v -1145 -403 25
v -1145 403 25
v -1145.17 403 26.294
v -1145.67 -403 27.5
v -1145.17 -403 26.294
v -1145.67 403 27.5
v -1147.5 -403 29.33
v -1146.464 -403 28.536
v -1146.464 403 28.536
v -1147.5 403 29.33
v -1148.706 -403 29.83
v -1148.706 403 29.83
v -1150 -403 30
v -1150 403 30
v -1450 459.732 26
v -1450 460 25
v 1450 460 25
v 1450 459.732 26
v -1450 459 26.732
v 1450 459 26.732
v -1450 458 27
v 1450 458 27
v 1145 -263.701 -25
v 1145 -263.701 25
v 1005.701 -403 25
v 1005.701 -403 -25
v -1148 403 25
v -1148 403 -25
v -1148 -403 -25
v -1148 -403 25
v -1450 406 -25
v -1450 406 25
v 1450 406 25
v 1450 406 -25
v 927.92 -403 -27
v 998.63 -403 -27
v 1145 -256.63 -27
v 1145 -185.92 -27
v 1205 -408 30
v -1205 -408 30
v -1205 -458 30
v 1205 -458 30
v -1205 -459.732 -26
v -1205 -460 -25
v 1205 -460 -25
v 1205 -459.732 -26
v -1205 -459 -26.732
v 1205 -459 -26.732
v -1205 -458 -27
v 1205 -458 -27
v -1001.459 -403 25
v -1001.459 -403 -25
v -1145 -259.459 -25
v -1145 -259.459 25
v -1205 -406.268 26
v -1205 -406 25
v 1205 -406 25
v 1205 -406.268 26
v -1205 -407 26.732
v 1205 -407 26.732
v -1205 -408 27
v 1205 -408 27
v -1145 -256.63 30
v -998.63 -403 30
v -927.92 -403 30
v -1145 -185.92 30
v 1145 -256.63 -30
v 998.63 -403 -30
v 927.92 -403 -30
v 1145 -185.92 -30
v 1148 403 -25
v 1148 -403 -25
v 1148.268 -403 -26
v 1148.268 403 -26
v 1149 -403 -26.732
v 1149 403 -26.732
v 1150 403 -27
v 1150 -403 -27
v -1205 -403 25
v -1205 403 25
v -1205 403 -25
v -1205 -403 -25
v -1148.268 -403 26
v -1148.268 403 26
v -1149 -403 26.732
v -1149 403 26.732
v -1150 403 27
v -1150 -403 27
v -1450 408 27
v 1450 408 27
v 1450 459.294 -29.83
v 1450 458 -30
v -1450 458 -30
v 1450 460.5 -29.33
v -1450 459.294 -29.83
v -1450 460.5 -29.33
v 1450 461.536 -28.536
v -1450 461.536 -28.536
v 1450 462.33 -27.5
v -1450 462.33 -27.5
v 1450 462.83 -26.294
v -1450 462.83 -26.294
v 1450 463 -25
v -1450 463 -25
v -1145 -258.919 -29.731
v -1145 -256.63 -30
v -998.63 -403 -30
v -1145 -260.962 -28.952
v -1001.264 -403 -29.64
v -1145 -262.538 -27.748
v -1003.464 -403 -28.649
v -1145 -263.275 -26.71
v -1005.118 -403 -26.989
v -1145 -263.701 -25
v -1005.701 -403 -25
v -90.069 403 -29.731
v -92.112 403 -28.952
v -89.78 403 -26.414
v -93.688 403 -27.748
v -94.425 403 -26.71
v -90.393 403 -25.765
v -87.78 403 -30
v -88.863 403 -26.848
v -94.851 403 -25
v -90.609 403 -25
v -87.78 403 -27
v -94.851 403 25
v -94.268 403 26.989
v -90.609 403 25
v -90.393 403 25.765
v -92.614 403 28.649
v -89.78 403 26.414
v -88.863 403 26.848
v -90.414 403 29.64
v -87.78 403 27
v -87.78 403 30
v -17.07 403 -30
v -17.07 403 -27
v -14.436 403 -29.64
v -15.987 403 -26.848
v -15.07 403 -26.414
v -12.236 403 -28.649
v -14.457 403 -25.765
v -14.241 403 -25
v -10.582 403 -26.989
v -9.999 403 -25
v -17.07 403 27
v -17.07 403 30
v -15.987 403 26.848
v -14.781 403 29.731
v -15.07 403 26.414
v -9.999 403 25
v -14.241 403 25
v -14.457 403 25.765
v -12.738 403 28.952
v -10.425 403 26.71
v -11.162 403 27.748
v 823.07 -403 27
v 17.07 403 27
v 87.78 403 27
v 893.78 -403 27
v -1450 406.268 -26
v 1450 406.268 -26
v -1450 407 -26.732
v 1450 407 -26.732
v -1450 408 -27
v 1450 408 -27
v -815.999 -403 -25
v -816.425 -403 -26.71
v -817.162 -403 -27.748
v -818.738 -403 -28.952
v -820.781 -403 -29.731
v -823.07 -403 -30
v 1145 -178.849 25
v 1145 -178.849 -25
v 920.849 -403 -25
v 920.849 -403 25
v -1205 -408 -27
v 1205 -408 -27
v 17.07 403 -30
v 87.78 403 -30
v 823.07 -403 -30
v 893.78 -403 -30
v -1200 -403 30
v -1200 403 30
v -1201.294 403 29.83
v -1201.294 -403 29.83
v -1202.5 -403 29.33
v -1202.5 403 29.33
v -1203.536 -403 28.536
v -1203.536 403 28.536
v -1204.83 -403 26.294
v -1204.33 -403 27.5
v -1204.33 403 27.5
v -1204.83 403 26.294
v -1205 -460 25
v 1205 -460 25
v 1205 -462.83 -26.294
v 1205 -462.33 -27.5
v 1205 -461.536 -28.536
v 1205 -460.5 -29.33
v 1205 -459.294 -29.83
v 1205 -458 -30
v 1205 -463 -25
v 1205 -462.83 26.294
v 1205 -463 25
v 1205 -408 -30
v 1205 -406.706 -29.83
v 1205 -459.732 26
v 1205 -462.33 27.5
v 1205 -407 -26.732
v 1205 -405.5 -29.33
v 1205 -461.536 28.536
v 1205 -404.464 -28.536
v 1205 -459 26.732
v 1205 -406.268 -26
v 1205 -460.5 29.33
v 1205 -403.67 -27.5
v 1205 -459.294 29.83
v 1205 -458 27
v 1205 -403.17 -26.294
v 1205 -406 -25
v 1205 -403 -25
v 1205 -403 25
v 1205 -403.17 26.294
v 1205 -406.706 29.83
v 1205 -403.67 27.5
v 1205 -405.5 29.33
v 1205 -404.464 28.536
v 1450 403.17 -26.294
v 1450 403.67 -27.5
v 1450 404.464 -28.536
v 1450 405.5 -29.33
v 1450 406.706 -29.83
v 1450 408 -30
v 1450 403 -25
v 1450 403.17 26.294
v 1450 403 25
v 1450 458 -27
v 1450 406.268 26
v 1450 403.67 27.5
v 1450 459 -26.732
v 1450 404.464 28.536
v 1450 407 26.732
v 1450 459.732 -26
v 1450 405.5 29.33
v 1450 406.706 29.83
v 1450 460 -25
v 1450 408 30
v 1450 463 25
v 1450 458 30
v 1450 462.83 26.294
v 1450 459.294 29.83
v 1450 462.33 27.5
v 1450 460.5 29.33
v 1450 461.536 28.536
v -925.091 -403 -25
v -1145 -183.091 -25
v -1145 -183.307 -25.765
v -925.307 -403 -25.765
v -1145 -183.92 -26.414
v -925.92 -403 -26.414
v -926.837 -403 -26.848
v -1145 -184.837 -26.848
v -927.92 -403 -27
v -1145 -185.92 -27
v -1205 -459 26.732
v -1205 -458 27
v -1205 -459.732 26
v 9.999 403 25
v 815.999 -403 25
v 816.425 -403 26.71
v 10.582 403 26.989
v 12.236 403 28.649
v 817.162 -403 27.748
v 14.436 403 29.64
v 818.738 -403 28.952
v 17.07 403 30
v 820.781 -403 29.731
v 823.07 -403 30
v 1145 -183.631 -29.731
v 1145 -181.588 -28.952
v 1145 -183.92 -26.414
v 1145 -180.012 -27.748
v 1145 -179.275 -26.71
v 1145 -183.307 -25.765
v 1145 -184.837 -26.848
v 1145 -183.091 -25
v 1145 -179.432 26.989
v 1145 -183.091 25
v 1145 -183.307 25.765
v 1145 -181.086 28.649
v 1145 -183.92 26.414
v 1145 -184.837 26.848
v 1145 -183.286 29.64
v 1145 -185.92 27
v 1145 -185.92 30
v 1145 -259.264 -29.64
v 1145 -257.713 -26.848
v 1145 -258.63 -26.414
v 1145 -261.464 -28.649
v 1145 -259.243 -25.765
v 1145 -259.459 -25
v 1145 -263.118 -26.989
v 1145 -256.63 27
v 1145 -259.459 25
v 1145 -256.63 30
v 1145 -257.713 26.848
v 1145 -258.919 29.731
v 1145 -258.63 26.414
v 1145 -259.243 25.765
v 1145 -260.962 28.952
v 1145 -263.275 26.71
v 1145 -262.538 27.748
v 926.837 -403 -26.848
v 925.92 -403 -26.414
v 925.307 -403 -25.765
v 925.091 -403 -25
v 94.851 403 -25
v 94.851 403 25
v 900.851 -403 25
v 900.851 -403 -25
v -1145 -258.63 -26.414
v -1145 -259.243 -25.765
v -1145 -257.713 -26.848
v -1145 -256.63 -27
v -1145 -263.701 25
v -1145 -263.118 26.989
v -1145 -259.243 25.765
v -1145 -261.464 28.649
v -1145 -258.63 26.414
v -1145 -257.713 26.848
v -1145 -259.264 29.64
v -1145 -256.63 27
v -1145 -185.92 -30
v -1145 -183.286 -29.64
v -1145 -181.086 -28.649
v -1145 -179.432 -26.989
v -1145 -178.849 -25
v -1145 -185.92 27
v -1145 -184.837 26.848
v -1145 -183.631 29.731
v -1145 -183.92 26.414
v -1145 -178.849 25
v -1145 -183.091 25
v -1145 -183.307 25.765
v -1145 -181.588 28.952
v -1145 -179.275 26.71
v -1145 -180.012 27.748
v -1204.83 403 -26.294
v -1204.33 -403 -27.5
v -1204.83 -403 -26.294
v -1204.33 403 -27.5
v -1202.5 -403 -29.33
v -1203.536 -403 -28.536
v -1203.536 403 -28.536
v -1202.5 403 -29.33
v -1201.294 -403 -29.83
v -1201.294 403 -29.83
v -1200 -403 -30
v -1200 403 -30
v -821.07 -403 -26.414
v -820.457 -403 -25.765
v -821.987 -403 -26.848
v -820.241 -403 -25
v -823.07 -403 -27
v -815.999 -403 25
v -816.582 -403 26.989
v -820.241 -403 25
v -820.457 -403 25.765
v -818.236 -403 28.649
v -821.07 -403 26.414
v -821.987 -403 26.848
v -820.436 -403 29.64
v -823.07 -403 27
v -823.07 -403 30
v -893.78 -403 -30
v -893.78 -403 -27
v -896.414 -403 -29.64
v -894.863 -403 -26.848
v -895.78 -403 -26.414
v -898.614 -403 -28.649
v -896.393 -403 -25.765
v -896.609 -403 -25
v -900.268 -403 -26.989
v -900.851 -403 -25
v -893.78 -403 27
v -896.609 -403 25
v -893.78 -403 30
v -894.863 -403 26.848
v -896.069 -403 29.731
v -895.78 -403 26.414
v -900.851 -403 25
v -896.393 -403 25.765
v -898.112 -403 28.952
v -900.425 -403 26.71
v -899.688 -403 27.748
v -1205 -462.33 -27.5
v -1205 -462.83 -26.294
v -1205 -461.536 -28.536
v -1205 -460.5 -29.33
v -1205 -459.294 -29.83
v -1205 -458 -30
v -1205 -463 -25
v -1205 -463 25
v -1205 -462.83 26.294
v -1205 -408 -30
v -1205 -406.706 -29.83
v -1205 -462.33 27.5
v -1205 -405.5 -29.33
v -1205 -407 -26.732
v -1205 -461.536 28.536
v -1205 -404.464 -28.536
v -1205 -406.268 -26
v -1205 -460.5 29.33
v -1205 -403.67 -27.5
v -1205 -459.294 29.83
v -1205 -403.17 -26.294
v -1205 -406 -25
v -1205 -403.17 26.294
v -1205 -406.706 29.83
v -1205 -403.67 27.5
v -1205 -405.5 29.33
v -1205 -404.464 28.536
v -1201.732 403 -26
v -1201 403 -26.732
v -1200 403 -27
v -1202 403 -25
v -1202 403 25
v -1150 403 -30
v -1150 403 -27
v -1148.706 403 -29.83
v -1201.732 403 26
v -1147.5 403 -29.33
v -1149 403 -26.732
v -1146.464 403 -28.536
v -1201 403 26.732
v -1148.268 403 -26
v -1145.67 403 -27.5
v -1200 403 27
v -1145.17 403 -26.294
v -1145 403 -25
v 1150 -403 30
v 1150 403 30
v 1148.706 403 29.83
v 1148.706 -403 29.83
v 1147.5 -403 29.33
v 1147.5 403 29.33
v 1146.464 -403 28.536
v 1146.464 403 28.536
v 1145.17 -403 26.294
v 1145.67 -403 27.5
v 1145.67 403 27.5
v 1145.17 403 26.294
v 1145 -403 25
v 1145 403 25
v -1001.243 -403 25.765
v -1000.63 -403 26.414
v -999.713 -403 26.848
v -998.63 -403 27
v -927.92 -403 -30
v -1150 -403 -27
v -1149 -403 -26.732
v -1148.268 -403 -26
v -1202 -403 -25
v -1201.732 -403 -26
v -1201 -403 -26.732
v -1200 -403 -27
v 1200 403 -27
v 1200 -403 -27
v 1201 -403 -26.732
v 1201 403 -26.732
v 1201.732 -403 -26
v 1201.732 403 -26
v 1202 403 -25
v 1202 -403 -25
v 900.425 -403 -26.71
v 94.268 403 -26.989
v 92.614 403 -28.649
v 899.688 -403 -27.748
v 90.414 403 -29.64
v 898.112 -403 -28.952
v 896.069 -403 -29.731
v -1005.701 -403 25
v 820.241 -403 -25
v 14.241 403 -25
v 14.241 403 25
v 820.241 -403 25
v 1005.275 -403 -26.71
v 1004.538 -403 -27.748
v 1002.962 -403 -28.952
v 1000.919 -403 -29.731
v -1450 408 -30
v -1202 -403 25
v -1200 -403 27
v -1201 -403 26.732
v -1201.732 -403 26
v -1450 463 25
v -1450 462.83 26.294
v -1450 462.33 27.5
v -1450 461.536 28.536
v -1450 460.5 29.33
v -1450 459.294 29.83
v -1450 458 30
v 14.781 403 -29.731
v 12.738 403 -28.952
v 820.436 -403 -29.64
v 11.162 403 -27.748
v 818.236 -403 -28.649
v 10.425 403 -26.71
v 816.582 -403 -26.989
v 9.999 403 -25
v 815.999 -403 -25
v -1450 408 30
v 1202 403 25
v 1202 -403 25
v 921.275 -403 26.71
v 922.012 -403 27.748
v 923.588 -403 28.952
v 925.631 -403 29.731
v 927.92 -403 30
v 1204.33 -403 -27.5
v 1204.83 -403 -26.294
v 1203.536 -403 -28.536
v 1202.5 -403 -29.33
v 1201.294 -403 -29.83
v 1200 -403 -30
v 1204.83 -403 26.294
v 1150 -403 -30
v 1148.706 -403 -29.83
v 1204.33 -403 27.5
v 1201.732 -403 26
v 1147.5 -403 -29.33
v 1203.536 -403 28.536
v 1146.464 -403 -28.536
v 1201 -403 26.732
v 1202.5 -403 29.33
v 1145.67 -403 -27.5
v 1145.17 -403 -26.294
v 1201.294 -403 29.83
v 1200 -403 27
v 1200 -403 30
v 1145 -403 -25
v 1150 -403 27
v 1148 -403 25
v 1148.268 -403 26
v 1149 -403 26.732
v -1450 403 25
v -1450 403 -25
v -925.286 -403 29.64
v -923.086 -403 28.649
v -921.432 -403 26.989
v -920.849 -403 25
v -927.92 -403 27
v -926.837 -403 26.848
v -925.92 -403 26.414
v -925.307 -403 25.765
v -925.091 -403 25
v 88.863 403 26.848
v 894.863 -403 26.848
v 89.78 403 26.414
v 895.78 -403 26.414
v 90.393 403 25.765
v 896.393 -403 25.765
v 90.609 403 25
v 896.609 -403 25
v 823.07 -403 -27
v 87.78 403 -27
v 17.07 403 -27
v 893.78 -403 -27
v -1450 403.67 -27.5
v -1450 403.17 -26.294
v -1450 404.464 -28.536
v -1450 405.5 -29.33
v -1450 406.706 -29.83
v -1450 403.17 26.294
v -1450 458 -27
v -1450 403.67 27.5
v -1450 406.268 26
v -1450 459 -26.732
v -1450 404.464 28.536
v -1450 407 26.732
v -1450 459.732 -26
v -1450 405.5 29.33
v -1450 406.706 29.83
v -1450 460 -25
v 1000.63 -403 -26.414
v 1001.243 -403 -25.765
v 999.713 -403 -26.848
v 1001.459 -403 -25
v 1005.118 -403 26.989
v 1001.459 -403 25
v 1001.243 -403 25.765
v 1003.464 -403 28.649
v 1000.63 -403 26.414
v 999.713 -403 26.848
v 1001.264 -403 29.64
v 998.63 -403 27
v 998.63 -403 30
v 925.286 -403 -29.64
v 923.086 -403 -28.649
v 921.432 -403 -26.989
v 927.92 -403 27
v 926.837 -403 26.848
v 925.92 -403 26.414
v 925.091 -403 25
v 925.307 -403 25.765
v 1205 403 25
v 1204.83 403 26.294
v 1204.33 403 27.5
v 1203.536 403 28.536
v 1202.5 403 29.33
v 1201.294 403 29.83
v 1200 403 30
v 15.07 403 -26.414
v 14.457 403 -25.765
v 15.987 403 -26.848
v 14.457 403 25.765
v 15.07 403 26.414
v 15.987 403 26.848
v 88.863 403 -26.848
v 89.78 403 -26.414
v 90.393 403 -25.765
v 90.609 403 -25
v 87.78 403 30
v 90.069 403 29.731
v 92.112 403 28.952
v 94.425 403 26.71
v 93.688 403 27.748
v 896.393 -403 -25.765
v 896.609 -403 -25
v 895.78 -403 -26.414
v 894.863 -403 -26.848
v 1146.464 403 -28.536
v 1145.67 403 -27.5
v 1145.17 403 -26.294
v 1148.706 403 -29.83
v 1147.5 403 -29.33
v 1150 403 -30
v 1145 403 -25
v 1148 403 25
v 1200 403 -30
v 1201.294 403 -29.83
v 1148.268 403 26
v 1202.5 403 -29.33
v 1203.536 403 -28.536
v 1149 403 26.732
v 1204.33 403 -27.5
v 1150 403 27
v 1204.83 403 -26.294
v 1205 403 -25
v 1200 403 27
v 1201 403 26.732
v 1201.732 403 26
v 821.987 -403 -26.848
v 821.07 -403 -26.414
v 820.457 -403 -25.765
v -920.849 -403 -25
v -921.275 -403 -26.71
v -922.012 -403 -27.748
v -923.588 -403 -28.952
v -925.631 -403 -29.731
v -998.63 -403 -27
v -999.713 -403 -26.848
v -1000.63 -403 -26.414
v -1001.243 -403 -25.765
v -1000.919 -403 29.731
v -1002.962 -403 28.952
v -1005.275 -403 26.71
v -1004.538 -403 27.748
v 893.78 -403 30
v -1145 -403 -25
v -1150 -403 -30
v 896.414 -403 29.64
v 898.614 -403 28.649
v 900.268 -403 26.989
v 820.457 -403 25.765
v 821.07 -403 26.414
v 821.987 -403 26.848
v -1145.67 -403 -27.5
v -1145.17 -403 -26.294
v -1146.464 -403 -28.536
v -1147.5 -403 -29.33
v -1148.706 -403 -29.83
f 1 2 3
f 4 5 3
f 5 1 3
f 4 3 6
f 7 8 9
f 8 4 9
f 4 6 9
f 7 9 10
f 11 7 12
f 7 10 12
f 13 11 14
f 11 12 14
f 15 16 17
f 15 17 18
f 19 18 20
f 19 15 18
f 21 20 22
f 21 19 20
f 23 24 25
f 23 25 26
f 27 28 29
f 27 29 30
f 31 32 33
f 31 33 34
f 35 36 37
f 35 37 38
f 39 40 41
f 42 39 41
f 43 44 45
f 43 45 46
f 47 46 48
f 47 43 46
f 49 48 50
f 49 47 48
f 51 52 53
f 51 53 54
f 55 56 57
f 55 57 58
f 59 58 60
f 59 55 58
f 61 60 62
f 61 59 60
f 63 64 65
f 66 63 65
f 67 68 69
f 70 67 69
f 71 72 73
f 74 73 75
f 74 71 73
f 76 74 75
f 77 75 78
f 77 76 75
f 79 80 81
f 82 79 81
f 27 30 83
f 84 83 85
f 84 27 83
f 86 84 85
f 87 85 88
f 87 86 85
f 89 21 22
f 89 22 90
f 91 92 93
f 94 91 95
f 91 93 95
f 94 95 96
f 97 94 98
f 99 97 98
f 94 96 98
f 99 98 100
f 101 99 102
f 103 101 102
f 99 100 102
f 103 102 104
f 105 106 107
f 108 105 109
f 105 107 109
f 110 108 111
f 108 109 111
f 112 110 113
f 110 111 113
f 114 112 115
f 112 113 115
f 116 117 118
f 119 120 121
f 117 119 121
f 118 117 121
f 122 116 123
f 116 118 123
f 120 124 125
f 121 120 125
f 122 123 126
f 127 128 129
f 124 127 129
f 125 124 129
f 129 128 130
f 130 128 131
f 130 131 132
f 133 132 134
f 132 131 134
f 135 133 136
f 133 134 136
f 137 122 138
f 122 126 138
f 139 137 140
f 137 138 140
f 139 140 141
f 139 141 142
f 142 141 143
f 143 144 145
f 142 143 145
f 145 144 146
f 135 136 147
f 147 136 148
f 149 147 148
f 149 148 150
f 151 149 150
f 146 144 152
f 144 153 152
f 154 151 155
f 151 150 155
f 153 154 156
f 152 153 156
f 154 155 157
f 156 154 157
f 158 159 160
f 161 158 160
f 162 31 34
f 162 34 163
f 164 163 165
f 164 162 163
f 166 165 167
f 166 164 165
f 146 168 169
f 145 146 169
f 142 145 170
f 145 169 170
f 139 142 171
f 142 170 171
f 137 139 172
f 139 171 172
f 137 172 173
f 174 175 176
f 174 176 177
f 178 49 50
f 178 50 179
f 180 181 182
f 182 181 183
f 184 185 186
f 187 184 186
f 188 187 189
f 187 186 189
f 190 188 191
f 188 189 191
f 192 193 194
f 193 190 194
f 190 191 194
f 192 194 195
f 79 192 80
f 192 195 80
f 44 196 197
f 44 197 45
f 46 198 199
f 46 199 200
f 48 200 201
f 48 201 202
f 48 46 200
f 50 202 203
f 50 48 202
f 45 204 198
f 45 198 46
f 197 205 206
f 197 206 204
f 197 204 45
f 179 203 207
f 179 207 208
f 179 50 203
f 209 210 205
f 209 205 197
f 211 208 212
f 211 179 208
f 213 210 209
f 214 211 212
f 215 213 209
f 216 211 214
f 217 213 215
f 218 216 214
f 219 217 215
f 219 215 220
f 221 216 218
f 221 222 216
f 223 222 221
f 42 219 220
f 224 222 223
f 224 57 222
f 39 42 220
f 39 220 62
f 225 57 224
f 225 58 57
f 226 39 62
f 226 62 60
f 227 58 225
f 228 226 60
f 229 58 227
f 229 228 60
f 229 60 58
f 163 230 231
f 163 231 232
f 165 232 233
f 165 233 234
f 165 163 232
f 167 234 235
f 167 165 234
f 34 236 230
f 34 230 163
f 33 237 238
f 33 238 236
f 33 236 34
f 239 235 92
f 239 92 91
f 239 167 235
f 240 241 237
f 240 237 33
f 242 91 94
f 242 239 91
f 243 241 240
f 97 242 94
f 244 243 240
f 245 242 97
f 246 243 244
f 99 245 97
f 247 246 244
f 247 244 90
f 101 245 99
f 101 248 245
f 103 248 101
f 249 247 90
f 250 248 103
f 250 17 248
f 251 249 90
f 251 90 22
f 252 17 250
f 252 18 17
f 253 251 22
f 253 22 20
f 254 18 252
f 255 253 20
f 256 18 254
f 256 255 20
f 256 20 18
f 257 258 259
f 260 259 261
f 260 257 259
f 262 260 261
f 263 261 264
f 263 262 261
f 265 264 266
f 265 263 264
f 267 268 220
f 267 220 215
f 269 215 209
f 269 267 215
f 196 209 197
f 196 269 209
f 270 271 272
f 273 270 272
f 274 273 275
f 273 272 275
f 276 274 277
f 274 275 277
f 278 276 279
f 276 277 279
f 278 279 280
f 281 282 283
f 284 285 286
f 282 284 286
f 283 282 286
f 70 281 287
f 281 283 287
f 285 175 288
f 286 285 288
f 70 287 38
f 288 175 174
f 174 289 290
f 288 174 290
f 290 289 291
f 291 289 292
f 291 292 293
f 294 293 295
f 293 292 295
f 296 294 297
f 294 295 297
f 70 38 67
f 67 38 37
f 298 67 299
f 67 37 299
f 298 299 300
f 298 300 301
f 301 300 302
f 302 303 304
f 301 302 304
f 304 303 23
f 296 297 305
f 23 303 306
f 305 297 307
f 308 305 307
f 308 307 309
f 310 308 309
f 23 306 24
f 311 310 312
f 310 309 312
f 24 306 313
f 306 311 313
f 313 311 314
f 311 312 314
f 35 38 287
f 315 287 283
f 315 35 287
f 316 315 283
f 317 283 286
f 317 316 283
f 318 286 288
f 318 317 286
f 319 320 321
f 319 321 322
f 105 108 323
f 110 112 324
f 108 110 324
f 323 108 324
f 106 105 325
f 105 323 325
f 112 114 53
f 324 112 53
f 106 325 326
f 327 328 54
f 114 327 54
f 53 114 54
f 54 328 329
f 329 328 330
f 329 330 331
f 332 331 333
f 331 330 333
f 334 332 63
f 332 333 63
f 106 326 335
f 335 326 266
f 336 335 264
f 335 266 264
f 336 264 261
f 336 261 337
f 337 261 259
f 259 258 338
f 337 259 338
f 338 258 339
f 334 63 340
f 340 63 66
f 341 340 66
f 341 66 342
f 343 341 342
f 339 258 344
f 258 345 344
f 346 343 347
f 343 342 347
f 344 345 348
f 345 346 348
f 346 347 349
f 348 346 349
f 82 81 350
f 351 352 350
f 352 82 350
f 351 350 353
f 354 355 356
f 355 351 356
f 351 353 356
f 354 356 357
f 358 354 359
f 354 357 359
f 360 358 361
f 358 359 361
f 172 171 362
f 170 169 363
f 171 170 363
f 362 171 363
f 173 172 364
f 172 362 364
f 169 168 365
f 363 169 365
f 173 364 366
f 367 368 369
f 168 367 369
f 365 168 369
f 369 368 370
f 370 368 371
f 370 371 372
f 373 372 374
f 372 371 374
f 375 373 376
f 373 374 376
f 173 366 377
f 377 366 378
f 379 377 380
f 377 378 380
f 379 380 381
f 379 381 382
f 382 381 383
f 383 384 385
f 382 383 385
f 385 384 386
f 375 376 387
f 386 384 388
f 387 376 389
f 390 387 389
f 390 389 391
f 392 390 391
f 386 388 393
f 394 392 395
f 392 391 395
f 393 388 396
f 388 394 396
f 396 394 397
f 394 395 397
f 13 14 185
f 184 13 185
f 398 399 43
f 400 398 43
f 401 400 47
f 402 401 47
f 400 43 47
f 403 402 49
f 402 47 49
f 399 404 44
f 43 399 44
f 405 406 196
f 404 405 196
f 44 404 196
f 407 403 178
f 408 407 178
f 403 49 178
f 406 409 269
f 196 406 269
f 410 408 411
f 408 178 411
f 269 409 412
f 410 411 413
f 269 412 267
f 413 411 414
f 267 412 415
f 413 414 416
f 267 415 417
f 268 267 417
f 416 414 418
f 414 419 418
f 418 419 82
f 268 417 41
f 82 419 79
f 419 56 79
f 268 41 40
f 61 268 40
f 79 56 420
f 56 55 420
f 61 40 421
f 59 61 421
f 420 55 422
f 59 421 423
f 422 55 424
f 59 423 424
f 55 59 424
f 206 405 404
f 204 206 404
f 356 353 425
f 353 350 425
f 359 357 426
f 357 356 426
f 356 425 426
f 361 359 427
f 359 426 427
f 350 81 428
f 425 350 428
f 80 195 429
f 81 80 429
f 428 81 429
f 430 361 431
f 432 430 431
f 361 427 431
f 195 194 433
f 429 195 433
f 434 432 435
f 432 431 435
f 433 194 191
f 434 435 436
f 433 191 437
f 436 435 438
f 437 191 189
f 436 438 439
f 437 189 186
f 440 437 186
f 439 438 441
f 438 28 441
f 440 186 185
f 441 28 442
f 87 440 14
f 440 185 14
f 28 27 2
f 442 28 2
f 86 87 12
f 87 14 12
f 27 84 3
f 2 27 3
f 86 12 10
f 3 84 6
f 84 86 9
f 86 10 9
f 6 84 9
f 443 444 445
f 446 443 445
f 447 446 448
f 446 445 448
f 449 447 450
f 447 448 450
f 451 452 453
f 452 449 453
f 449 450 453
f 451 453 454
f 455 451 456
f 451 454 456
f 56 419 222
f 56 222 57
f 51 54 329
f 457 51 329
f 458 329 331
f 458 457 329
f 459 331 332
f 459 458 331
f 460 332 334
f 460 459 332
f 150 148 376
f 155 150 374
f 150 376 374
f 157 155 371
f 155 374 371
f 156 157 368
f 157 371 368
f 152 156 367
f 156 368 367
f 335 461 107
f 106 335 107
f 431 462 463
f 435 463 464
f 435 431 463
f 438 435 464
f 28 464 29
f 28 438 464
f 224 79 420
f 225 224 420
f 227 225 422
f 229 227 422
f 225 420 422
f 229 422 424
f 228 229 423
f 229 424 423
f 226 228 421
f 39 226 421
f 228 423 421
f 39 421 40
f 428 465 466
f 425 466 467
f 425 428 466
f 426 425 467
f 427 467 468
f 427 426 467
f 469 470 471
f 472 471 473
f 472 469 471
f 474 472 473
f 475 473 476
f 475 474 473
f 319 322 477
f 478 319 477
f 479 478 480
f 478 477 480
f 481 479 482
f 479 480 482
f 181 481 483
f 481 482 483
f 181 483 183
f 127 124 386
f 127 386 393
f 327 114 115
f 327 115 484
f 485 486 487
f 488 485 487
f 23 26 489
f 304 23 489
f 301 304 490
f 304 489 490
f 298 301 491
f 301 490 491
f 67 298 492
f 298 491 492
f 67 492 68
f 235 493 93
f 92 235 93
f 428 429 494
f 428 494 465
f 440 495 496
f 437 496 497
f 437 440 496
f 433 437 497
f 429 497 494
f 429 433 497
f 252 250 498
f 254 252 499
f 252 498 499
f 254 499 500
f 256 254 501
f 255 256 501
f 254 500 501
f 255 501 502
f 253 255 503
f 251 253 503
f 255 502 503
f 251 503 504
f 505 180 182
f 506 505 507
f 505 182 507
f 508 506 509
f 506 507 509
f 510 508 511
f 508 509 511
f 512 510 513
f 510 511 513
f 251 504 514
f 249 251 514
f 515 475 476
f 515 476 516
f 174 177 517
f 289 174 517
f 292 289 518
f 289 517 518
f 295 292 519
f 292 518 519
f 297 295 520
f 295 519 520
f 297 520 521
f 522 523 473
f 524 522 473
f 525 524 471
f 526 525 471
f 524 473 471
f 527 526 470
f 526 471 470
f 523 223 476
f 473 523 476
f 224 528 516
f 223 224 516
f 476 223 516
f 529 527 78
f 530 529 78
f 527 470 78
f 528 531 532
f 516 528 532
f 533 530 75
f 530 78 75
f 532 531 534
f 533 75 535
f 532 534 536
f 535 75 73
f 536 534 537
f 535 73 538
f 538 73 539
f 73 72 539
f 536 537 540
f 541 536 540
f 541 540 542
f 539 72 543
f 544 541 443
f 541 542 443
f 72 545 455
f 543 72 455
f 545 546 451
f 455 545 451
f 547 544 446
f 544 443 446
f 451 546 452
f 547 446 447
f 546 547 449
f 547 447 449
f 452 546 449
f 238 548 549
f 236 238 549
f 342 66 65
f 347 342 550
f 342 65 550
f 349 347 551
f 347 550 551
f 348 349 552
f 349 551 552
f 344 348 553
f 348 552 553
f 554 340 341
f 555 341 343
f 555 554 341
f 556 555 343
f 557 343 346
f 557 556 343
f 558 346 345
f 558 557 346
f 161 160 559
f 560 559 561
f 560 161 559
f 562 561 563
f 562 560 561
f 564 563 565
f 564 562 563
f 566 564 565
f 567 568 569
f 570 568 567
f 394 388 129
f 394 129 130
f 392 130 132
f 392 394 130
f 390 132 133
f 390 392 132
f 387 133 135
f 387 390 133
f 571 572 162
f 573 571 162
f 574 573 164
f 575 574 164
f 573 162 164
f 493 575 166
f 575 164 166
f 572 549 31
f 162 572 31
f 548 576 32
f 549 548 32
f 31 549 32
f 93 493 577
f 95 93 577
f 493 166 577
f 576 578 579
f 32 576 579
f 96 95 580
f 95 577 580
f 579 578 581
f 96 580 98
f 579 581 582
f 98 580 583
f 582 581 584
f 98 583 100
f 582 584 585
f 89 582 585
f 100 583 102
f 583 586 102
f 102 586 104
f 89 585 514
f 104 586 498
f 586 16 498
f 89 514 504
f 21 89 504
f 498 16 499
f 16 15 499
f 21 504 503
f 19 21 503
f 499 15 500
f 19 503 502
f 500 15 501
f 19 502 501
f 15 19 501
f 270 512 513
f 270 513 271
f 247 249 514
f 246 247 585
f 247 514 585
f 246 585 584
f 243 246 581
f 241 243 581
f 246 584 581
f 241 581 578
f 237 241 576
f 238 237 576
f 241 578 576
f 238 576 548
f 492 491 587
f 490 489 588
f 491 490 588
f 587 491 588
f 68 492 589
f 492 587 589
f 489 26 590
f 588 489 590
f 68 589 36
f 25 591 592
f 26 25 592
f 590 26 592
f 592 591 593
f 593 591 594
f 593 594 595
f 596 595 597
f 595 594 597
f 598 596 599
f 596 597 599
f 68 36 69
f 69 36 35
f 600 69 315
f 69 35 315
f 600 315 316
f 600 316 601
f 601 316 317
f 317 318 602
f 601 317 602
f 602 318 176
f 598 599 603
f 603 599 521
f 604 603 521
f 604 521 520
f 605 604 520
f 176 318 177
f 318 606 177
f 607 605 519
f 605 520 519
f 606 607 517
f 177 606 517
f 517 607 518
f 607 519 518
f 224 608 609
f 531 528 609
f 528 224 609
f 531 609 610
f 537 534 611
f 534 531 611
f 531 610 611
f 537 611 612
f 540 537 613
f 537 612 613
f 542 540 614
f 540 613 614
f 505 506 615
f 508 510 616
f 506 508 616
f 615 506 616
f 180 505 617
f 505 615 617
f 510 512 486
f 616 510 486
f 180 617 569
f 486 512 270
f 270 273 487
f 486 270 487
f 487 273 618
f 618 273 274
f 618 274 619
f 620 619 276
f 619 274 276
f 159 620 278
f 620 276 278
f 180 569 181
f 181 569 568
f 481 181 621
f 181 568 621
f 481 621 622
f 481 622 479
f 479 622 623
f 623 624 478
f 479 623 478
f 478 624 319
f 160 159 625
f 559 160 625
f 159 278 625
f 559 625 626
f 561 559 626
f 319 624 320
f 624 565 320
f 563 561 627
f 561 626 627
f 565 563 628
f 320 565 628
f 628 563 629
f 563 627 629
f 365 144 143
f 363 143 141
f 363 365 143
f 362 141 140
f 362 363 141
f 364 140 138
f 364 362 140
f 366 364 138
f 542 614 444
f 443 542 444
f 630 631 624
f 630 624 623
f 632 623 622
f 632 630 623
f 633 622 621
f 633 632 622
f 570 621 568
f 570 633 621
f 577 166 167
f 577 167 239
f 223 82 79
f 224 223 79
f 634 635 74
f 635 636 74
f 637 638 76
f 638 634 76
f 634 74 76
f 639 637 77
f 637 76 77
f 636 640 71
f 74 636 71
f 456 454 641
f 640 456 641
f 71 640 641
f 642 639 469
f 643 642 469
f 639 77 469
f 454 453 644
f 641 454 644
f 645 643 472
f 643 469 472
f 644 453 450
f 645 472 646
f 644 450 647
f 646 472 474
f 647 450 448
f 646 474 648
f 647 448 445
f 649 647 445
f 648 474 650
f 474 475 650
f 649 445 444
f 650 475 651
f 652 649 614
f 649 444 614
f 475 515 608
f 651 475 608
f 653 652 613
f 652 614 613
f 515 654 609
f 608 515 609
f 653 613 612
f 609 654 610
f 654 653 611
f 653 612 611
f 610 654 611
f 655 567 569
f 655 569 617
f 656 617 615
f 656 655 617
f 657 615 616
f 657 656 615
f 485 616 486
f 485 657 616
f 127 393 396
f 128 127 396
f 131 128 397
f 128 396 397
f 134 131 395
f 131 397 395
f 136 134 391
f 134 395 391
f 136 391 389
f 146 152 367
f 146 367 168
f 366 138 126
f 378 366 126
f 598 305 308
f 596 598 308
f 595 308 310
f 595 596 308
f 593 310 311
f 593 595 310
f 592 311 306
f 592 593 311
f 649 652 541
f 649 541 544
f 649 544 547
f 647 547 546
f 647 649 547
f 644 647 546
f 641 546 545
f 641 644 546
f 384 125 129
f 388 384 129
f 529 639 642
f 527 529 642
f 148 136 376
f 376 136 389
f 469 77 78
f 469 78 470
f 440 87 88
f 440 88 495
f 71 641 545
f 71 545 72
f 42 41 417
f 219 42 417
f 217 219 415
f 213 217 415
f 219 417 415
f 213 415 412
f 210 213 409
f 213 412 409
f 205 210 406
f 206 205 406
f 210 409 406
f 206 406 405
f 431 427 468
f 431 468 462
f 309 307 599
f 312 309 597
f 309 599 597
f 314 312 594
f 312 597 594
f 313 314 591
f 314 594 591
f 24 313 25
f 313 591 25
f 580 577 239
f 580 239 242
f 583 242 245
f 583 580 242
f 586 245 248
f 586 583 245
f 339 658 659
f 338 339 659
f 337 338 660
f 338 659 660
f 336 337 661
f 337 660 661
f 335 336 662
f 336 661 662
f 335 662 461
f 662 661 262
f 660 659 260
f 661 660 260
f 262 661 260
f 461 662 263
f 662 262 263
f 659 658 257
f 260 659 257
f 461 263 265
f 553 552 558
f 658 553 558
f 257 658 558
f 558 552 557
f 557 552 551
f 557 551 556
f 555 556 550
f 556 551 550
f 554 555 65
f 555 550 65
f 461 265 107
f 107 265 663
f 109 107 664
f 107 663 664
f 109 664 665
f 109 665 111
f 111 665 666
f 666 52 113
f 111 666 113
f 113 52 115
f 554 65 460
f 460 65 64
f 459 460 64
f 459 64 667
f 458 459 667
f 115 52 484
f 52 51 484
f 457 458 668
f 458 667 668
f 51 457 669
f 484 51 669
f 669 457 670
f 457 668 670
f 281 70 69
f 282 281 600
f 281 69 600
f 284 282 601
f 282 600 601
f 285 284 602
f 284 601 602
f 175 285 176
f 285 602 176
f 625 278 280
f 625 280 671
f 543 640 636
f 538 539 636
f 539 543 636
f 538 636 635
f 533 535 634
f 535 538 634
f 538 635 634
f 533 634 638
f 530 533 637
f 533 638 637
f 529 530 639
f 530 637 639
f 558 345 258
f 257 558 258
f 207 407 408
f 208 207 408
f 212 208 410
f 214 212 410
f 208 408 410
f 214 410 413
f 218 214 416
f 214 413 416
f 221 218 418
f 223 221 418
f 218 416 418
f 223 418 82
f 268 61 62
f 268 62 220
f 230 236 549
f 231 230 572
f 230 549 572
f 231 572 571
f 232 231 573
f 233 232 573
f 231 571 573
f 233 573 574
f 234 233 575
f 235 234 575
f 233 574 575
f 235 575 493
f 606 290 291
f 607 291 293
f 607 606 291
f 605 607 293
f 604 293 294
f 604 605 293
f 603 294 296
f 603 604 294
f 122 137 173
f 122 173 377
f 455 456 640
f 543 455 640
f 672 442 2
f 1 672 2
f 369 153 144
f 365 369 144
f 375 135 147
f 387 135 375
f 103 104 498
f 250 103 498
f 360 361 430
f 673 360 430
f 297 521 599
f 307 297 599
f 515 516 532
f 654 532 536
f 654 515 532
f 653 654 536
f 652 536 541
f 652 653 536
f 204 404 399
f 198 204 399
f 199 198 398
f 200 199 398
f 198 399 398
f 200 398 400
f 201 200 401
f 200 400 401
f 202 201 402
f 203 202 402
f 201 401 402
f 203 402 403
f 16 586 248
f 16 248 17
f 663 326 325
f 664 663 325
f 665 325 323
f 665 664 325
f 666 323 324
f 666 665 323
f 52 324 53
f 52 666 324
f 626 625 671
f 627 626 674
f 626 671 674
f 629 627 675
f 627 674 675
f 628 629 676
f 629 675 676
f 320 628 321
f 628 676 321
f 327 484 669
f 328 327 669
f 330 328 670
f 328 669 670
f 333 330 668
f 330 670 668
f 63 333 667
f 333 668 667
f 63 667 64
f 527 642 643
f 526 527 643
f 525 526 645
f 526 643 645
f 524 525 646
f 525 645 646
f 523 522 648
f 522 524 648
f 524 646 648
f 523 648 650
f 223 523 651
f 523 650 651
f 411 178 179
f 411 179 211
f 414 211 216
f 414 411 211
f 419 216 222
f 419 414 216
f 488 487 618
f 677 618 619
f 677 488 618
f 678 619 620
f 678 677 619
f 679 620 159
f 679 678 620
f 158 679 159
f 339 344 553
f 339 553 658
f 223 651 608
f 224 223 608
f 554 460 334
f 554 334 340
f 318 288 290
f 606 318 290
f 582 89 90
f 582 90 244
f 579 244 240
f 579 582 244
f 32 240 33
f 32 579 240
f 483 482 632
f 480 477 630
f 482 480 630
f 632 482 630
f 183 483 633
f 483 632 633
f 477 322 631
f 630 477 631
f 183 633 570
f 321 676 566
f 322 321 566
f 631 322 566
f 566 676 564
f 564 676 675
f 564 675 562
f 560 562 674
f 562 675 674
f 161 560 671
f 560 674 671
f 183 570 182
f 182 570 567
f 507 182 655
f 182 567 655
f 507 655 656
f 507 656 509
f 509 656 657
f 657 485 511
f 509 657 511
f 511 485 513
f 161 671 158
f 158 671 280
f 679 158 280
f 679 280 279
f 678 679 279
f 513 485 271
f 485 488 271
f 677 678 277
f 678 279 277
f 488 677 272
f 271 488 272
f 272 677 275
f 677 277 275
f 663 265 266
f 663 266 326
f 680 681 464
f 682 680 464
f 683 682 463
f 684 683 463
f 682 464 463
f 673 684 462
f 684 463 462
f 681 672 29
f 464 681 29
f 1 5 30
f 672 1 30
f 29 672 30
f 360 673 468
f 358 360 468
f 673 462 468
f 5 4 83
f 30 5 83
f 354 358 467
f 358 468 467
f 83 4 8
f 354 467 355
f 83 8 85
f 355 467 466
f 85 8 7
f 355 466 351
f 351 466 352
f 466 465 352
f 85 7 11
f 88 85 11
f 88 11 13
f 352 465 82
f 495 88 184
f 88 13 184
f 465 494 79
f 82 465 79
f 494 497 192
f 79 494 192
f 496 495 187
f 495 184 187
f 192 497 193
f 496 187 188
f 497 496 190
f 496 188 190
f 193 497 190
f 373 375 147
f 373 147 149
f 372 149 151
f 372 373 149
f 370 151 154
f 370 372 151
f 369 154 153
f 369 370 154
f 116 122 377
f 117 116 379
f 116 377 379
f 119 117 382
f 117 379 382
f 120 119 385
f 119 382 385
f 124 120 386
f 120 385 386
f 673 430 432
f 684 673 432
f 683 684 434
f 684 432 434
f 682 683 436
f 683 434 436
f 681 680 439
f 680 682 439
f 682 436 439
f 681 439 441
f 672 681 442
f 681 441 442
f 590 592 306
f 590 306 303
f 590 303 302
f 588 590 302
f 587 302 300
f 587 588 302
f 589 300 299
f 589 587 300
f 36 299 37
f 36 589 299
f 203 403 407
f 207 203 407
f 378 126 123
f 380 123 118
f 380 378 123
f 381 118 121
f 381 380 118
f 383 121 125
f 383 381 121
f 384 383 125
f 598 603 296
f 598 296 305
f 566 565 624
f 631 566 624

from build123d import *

# Parameters (mm, degrees)
F_60_X_40_X_3_2_1_DEPTH   = 2900
F_60_X_40_X_3_2_1_2_DEPTH = 2410
F_60_X_40_X_3_2_1_3_DEPTH = 868
F_60_X_40_X_3_2_1_4_DEPTH = 868
F_60_X_40_X_3_2_1_5_DEPTH = 428.703587107
F_60_X_40_X_3_2_1_6_DEPTH = 1311.561758757
F_60_X_40_X_3_2_1_7_DEPTH = 1311.561758757
F_60_X_40_X_3_2_1_8_DEPTH = 428.703587107


with BuildPart() as part:
    # Sketch1 → Прямоугольная труба 60 X 40 X 3.2(1) (new body)
    with BuildSketch(Plane(origin=(-1450, 433, 0), x_dir=(0, 1, 0), z_dir=(1, 0, 0))):
        with BuildLine():
            Line((-25, -30), (25, -30))
            ThreePointArc((25, -30), (28.535533906, -28.535533906), (30, -25))
            Line((30, -25), (30, 25))
            ThreePointArc((30, 25), (28.535533906, 28.535533906), (25, 30))
            Line((25, 30), (-25, 30))
            ThreePointArc((-25, 30), (-28.535533906, 28.535533906), (-30, 25))
            Line((-30, 25), (-30, -25))
            ThreePointArc((-30, -25), (-28.535533906, -28.535533906), (-25, -30))
        make_face()
        with BuildLine():
            Line((-25, -27), (25, -27))
            ThreePointArc((25, -27), (26.414213562, -26.414213562), (27, -25))
            Line((27, -25), (27, 25))
            ThreePointArc((27, 25), (26.414213562, 26.414213562), (25, 27))
            Line((25, 27), (-25, 27))
            ThreePointArc((-25, 27), (-26.414213562, 26.414213562), (-27, 25))
            Line((-27, 25), (-27, -25))
            ThreePointArc((-27, -25), (-26.414213562, -26.414213562), (-25, -27))
        make_face(mode=Mode.SUBTRACT)
    extrude(amount=F_60_X_40_X_3_2_1_DEPTH)


with BuildPart() as body_2:
    # Sketch1 on segment 2 (carried to segment 2) → 60 X 40 X 3.2_1 2 (new body)
    with BuildSketch(Plane(origin=(-1205, -433, 0), x_dir=(0, 1, 0), z_dir=(1, 0, 0))):
        with BuildLine():
            Line((-25, -30), (25, -30))
            ThreePointArc((25, -30), (28.535533906, -28.535533906), (30, -25))
            Line((30, -25), (30, 25))
            ThreePointArc((30, 25), (28.535533906, 28.535533906), (25, 30))
            Line((25, 30), (-25, 30))
            ThreePointArc((-25, 30), (-28.535533906, 28.535533906), (-30, 25))
            Line((-30, 25), (-30, -25))
            ThreePointArc((-30, -25), (-28.535533906, -28.535533906), (-25, -30))
        make_face()
        with BuildLine():
            Line((-25, -27), (25, -27))
            ThreePointArc((25, -27), (26.414213562, -26.414213562), (27, -25))
            Line((27, -25), (27, 25))
            ThreePointArc((27, 25), (26.414213562, 26.414213562), (25, 27))
            Line((25, 27), (-25, 27))
            ThreePointArc((-25, 27), (-26.414213562, 26.414213562), (-27, 25))
            Line((-27, 25), (-27, -25))
            ThreePointArc((-27, -25), (-26.414213562, -26.414213562), (-25, -27))
        make_face(mode=Mode.SUBTRACT)
    extrude(amount=F_60_X_40_X_3_2_1_2_DEPTH)


with BuildPart() as body_3:
    # Sketch1 on segment 3 (carried to segment 3) → 60 X 40 X 3.2_1 3 (new body)
    with BuildSketch(Plane(origin=(-1175, 434, 0), x_dir=(1, 0, 0), z_dir=(0, -1, 0))):
        with BuildLine():
            Line((-25, -30), (25, -30))
            ThreePointArc((25, -30), (28.535533906, -28.535533906), (30, -25))
            Line((30, -25), (30, 25))
            ThreePointArc((30, 25), (28.535533906, 28.535533906), (25, 30))
            Line((25, 30), (-25, 30))
            ThreePointArc((-25, 30), (-28.535533906, 28.535533906), (-30, 25))
            Line((-30, 25), (-30, -25))
            ThreePointArc((-30, -25), (-28.535533906, -28.535533906), (-25, -30))
        make_face()
        with BuildLine():
            Line((-25, -27), (25, -27))
            ThreePointArc((25, -27), (26.414213562, -26.414213562), (27, -25))
            Line((27, -25), (27, 25))
            ThreePointArc((27, 25), (26.414213562, 26.414213562), (25, 27))
            Line((25, 27), (-25, 27))
            ThreePointArc((-25, 27), (-26.414213562, 26.414213562), (-27, 25))
            Line((-27, 25), (-27, -25))
            ThreePointArc((-27, -25), (-26.414213562, -26.414213562), (-25, -27))
        make_face(mode=Mode.SUBTRACT)
    extrude(amount=F_60_X_40_X_3_2_1_3_DEPTH)

    # 60 X 40 X 3.2_1 3 end butt 1
    split(bisect_by=Plane(origin=(-1175, 403, 0), x_dir=(1, 0, 0), z_dir=(0, -1, 0)), keep=Keep.TOP)

    # 60 X 40 X 3.2_1 3 end butt 2
    split(bisect_by=Plane(origin=(-1175, -403, 0), x_dir=(-1, 0, 0), z_dir=(0, 1, 0)), keep=Keep.TOP)


with BuildPart() as body_4:
    # Sketch1 on segment 4 (carried to segment 4) → 60 X 40 X 3.2_1 4 (new body)
    with BuildSketch(Plane(origin=(1175, 434, 0), x_dir=(1, 0, 0), z_dir=(0, -1, 0))):
        with BuildLine():
            Line((-25, -30), (25, -30))
            ThreePointArc((25, -30), (28.535533906, -28.535533906), (30, -25))
            Line((30, -25), (30, 25))
            ThreePointArc((30, 25), (28.535533906, 28.535533906), (25, 30))
            Line((25, 30), (-25, 30))
            ThreePointArc((-25, 30), (-28.535533906, 28.535533906), (-30, 25))
            Line((-30, 25), (-30, -25))
            ThreePointArc((-30, -25), (-28.535533906, -28.535533906), (-25, -30))
        make_face()
        with BuildLine():
            Line((-25, -27), (25, -27))
            ThreePointArc((25, -27), (26.414213562, -26.414213562), (27, -25))
            Line((27, -25), (27, 25))
            ThreePointArc((27, 25), (26.414213562, 26.414213562), (25, 27))
            Line((25, 27), (-25, 27))
            ThreePointArc((-25, 27), (-26.414213562, 26.414213562), (-27, 25))
            Line((-27, 25), (-27, -25))
            ThreePointArc((-27, -25), (-26.414213562, -26.414213562), (-25, -27))
        make_face(mode=Mode.SUBTRACT)
    extrude(amount=F_60_X_40_X_3_2_1_4_DEPTH)

    # 60 X 40 X 3.2_1 4 end butt 1
    split(bisect_by=Plane(origin=(1175, 403, 0), x_dir=(1, 0, 0), z_dir=(0, -1, 0)), keep=Keep.TOP)

    # 60 X 40 X 3.2_1 4 end butt 2
    split(bisect_by=Plane(origin=(1175, -403, 0), x_dir=(-1, 0, 0), z_dir=(0, 1, 0)), keep=Keep.TOP)


with BuildPart() as body_5:
    # Sketch1 on segment 5 (carried to segment 5) → 60 X 40 X 3.2_1 5 (new body)
    with BuildSketch(Plane(origin=(-902.567893219, -463.707106781, 0), x_dir=(-0.707106781, -0.707106781, 0), z_dir=(-0.707106781, 0.707106781, 0))):
        with BuildLine():
            Line((-25, -30), (25, -30))
            ThreePointArc((25, -30), (28.535533906, -28.535533906), (30, -25))
            Line((30, -25), (30, 25))
            ThreePointArc((30, 25), (28.535533906, 28.535533906), (25, 30))
            Line((25, 30), (-25, 30))
            ThreePointArc((-25, 30), (-28.535533906, 28.535533906), (-30, 25))
            Line((-30, 25), (-30, -25))
            ThreePointArc((-30, -25), (-28.535533906, -28.535533906), (-25, -30))
        make_face()
        with BuildLine():
            Line((-25, -27), (25, -27))
            ThreePointArc((25, -27), (26.414213562, -26.414213562), (27, -25))
            Line((27, -25), (27, 25))
            ThreePointArc((27, 25), (26.414213562, 26.414213562), (25, 27))
            Line((25, 27), (-25, 27))
            ThreePointArc((-25, 27), (-26.414213562, 26.414213562), (-27, 25))
            Line((-27, 25), (-27, -25))
            ThreePointArc((-27, -25), (-26.414213562, -26.414213562), (-25, -27))
        make_face(mode=Mode.SUBTRACT)
    extrude(amount=F_60_X_40_X_3_2_1_5_DEPTH)

    # 60 X 40 X 3.2_1 5 end butt 1
    split(bisect_by=Plane(origin=(-933.275, -403, 0), x_dir=(-1, 0, 0), z_dir=(0, 1, 0)), keep=Keep.TOP)

    # 60 X 40 X 3.2_1 5 end butt 2
    split(bisect_by=Plane(origin=(-1145, -191.275, 0), x_dir=(0, 1, 0), z_dir=(1, 0, 0)), keep=Keep.TOP)


with BuildPart() as body_6:
    # Sketch1 on segment 6 (carried to segment 6) → 60 X 40 X 3.2_1 6 (new body)
    with BuildSketch(Plane(origin=(-919.132106781, -463.707106781, 0), x_dir=(-0.707106781, 0.707106781, 0), z_dir=(0.707106781, 0.707106781, 0))):
        with BuildLine():
            Line((-25, -30), (25, -30))
            ThreePointArc((25, -30), (28.535533906, -28.535533906), (30, -25))
            Line((30, -25), (30, 25))
            ThreePointArc((30, 25), (28.535533906, 28.535533906), (25, 30))
            Line((25, 30), (-25, 30))
            ThreePointArc((-25, 30), (-28.535533906, 28.535533906), (-30, 25))
            Line((-30, 25), (-30, -25))
            ThreePointArc((-30, -25), (-28.535533906, -28.535533906), (-25, -30))
        make_face()
        with BuildLine():
            Line((-25, -27), (25, -27))
            ThreePointArc((25, -27), (26.414213562, -26.414213562), (27, -25))
            Line((27, -25), (27, 25))
            ThreePointArc((27, 25), (26.414213562, 26.414213562), (25, 27))
            Line((25, 27), (-25, 27))
            ThreePointArc((-25, 27), (-26.414213562, 26.414213562), (-27, 25))
            Line((-27, 25), (-27, -25))
            ThreePointArc((-27, -25), (-26.414213562, -26.414213562), (-25, -27))
        make_face(mode=Mode.SUBTRACT)
    extrude(amount=F_60_X_40_X_3_2_1_6_DEPTH)

    # 60 X 40 X 3.2_1 6 end butt 1
    split(bisect_by=Plane(origin=(-888.425, -403, 0), x_dir=(-1, 0, 0), z_dir=(0, 1, 0)), keep=Keep.TOP)

    # 60 X 40 X 3.2_1 6 end butt 2
    split(bisect_by=Plane(origin=(-22.425, 403, 0), x_dir=(1, 0, 0), z_dir=(0, -1, 0)), keep=Keep.TOP)


with BuildPart() as body_7:
    # Sketch1 on segment 7 (carried to segment 7) → 60 X 40 X 3.2_1 7 (new body)
    with BuildSketch(Plane(origin=(919.132106781, -463.707106781, 0), x_dir=(-0.707106781, -0.707106781, 0), z_dir=(-0.707106781, 0.707106781, 0))):
        with BuildLine():
            Line((-25, -30), (25, -30))
            ThreePointArc((25, -30), (28.535533906, -28.535533906), (30, -25))
            Line((30, -25), (30, 25))
            ThreePointArc((30, 25), (28.535533906, 28.535533906), (25, 30))
            Line((25, 30), (-25, 30))
            ThreePointArc((-25, 30), (-28.535533906, 28.535533906), (-30, 25))
            Line((-30, 25), (-30, -25))
            ThreePointArc((-30, -25), (-28.535533906, -28.535533906), (-25, -30))
        make_face()
        with BuildLine():
            Line((-25, -27), (25, -27))
            ThreePointArc((25, -27), (26.414213562, -26.414213562), (27, -25))
            Line((27, -25), (27, 25))
            ThreePointArc((27, 25), (26.414213562, 26.414213562), (25, 27))
            Line((25, 27), (-25, 27))
            ThreePointArc((-25, 27), (-26.414213562, 26.414213562), (-27, 25))
            Line((-27, 25), (-27, -25))
            ThreePointArc((-27, -25), (-26.414213562, -26.414213562), (-25, -27))
        make_face(mode=Mode.SUBTRACT)
    extrude(amount=F_60_X_40_X_3_2_1_7_DEPTH)

    # 60 X 40 X 3.2_1 7 end butt 1
    split(bisect_by=Plane(origin=(888.425, -403, 0), x_dir=(-1, 0, 0), z_dir=(0, 1, 0)), keep=Keep.TOP)

    # 60 X 40 X 3.2_1 7 end butt 2
    split(bisect_by=Plane(origin=(22.425, 403, 0), x_dir=(1, 0, 0), z_dir=(0, -1, 0)), keep=Keep.TOP)


with BuildPart() as body_8:
    # Sketch1 on segment 8 (carried to segment 8) → 60 X 40 X 3.2_1 8 (new body)
    with BuildSketch(Plane(origin=(902.567893219, -463.707106781, 0), x_dir=(-0.707106781, 0.707106781, 0), z_dir=(0.707106781, 0.707106781, 0))):
        with BuildLine():
            Line((-25, -30), (25, -30))
            ThreePointArc((25, -30), (28.535533906, -28.535533906), (30, -25))
            Line((30, -25), (30, 25))
            ThreePointArc((30, 25), (28.535533906, 28.535533906), (25, 30))
            Line((25, 30), (-25, 30))
            ThreePointArc((-25, 30), (-28.535533906, 28.535533906), (-30, 25))
            Line((-30, 25), (-30, -25))
            ThreePointArc((-30, -25), (-28.535533906, -28.535533906), (-25, -30))
        make_face()
        with BuildLine():
            Line((-25, -27), (25, -27))
            ThreePointArc((25, -27), (26.414213562, -26.414213562), (27, -25))
            Line((27, -25), (27, 25))
            ThreePointArc((27, 25), (26.414213562, 26.414213562), (25, 27))
            Line((25, 27), (-25, 27))
            ThreePointArc((-25, 27), (-26.414213562, 26.414213562), (-27, 25))
            Line((-27, 25), (-27, -25))
            ThreePointArc((-27, -25), (-26.414213562, -26.414213562), (-25, -27))
        make_face(mode=Mode.SUBTRACT)
    extrude(amount=F_60_X_40_X_3_2_1_8_DEPTH)

    # 60 X 40 X 3.2_1 8 end butt 1
    split(bisect_by=Plane(origin=(933.275, -403, 0), x_dir=(-1, 0, 0), z_dir=(0, 1, 0)), keep=Keep.TOP)

    # 60 X 40 X 3.2_1 8 end butt 2
    split(bisect_by=Plane(origin=(1145, -191.275, 0), x_dir=(0, -1, 0), z_dir=(-1, 0, 0)), keep=Keep.TOP)


solid = Compound([part.part, body_2.part, body_3.part, body_4.part, body_5.part, body_6.part, body_7.part, body_8.part])
